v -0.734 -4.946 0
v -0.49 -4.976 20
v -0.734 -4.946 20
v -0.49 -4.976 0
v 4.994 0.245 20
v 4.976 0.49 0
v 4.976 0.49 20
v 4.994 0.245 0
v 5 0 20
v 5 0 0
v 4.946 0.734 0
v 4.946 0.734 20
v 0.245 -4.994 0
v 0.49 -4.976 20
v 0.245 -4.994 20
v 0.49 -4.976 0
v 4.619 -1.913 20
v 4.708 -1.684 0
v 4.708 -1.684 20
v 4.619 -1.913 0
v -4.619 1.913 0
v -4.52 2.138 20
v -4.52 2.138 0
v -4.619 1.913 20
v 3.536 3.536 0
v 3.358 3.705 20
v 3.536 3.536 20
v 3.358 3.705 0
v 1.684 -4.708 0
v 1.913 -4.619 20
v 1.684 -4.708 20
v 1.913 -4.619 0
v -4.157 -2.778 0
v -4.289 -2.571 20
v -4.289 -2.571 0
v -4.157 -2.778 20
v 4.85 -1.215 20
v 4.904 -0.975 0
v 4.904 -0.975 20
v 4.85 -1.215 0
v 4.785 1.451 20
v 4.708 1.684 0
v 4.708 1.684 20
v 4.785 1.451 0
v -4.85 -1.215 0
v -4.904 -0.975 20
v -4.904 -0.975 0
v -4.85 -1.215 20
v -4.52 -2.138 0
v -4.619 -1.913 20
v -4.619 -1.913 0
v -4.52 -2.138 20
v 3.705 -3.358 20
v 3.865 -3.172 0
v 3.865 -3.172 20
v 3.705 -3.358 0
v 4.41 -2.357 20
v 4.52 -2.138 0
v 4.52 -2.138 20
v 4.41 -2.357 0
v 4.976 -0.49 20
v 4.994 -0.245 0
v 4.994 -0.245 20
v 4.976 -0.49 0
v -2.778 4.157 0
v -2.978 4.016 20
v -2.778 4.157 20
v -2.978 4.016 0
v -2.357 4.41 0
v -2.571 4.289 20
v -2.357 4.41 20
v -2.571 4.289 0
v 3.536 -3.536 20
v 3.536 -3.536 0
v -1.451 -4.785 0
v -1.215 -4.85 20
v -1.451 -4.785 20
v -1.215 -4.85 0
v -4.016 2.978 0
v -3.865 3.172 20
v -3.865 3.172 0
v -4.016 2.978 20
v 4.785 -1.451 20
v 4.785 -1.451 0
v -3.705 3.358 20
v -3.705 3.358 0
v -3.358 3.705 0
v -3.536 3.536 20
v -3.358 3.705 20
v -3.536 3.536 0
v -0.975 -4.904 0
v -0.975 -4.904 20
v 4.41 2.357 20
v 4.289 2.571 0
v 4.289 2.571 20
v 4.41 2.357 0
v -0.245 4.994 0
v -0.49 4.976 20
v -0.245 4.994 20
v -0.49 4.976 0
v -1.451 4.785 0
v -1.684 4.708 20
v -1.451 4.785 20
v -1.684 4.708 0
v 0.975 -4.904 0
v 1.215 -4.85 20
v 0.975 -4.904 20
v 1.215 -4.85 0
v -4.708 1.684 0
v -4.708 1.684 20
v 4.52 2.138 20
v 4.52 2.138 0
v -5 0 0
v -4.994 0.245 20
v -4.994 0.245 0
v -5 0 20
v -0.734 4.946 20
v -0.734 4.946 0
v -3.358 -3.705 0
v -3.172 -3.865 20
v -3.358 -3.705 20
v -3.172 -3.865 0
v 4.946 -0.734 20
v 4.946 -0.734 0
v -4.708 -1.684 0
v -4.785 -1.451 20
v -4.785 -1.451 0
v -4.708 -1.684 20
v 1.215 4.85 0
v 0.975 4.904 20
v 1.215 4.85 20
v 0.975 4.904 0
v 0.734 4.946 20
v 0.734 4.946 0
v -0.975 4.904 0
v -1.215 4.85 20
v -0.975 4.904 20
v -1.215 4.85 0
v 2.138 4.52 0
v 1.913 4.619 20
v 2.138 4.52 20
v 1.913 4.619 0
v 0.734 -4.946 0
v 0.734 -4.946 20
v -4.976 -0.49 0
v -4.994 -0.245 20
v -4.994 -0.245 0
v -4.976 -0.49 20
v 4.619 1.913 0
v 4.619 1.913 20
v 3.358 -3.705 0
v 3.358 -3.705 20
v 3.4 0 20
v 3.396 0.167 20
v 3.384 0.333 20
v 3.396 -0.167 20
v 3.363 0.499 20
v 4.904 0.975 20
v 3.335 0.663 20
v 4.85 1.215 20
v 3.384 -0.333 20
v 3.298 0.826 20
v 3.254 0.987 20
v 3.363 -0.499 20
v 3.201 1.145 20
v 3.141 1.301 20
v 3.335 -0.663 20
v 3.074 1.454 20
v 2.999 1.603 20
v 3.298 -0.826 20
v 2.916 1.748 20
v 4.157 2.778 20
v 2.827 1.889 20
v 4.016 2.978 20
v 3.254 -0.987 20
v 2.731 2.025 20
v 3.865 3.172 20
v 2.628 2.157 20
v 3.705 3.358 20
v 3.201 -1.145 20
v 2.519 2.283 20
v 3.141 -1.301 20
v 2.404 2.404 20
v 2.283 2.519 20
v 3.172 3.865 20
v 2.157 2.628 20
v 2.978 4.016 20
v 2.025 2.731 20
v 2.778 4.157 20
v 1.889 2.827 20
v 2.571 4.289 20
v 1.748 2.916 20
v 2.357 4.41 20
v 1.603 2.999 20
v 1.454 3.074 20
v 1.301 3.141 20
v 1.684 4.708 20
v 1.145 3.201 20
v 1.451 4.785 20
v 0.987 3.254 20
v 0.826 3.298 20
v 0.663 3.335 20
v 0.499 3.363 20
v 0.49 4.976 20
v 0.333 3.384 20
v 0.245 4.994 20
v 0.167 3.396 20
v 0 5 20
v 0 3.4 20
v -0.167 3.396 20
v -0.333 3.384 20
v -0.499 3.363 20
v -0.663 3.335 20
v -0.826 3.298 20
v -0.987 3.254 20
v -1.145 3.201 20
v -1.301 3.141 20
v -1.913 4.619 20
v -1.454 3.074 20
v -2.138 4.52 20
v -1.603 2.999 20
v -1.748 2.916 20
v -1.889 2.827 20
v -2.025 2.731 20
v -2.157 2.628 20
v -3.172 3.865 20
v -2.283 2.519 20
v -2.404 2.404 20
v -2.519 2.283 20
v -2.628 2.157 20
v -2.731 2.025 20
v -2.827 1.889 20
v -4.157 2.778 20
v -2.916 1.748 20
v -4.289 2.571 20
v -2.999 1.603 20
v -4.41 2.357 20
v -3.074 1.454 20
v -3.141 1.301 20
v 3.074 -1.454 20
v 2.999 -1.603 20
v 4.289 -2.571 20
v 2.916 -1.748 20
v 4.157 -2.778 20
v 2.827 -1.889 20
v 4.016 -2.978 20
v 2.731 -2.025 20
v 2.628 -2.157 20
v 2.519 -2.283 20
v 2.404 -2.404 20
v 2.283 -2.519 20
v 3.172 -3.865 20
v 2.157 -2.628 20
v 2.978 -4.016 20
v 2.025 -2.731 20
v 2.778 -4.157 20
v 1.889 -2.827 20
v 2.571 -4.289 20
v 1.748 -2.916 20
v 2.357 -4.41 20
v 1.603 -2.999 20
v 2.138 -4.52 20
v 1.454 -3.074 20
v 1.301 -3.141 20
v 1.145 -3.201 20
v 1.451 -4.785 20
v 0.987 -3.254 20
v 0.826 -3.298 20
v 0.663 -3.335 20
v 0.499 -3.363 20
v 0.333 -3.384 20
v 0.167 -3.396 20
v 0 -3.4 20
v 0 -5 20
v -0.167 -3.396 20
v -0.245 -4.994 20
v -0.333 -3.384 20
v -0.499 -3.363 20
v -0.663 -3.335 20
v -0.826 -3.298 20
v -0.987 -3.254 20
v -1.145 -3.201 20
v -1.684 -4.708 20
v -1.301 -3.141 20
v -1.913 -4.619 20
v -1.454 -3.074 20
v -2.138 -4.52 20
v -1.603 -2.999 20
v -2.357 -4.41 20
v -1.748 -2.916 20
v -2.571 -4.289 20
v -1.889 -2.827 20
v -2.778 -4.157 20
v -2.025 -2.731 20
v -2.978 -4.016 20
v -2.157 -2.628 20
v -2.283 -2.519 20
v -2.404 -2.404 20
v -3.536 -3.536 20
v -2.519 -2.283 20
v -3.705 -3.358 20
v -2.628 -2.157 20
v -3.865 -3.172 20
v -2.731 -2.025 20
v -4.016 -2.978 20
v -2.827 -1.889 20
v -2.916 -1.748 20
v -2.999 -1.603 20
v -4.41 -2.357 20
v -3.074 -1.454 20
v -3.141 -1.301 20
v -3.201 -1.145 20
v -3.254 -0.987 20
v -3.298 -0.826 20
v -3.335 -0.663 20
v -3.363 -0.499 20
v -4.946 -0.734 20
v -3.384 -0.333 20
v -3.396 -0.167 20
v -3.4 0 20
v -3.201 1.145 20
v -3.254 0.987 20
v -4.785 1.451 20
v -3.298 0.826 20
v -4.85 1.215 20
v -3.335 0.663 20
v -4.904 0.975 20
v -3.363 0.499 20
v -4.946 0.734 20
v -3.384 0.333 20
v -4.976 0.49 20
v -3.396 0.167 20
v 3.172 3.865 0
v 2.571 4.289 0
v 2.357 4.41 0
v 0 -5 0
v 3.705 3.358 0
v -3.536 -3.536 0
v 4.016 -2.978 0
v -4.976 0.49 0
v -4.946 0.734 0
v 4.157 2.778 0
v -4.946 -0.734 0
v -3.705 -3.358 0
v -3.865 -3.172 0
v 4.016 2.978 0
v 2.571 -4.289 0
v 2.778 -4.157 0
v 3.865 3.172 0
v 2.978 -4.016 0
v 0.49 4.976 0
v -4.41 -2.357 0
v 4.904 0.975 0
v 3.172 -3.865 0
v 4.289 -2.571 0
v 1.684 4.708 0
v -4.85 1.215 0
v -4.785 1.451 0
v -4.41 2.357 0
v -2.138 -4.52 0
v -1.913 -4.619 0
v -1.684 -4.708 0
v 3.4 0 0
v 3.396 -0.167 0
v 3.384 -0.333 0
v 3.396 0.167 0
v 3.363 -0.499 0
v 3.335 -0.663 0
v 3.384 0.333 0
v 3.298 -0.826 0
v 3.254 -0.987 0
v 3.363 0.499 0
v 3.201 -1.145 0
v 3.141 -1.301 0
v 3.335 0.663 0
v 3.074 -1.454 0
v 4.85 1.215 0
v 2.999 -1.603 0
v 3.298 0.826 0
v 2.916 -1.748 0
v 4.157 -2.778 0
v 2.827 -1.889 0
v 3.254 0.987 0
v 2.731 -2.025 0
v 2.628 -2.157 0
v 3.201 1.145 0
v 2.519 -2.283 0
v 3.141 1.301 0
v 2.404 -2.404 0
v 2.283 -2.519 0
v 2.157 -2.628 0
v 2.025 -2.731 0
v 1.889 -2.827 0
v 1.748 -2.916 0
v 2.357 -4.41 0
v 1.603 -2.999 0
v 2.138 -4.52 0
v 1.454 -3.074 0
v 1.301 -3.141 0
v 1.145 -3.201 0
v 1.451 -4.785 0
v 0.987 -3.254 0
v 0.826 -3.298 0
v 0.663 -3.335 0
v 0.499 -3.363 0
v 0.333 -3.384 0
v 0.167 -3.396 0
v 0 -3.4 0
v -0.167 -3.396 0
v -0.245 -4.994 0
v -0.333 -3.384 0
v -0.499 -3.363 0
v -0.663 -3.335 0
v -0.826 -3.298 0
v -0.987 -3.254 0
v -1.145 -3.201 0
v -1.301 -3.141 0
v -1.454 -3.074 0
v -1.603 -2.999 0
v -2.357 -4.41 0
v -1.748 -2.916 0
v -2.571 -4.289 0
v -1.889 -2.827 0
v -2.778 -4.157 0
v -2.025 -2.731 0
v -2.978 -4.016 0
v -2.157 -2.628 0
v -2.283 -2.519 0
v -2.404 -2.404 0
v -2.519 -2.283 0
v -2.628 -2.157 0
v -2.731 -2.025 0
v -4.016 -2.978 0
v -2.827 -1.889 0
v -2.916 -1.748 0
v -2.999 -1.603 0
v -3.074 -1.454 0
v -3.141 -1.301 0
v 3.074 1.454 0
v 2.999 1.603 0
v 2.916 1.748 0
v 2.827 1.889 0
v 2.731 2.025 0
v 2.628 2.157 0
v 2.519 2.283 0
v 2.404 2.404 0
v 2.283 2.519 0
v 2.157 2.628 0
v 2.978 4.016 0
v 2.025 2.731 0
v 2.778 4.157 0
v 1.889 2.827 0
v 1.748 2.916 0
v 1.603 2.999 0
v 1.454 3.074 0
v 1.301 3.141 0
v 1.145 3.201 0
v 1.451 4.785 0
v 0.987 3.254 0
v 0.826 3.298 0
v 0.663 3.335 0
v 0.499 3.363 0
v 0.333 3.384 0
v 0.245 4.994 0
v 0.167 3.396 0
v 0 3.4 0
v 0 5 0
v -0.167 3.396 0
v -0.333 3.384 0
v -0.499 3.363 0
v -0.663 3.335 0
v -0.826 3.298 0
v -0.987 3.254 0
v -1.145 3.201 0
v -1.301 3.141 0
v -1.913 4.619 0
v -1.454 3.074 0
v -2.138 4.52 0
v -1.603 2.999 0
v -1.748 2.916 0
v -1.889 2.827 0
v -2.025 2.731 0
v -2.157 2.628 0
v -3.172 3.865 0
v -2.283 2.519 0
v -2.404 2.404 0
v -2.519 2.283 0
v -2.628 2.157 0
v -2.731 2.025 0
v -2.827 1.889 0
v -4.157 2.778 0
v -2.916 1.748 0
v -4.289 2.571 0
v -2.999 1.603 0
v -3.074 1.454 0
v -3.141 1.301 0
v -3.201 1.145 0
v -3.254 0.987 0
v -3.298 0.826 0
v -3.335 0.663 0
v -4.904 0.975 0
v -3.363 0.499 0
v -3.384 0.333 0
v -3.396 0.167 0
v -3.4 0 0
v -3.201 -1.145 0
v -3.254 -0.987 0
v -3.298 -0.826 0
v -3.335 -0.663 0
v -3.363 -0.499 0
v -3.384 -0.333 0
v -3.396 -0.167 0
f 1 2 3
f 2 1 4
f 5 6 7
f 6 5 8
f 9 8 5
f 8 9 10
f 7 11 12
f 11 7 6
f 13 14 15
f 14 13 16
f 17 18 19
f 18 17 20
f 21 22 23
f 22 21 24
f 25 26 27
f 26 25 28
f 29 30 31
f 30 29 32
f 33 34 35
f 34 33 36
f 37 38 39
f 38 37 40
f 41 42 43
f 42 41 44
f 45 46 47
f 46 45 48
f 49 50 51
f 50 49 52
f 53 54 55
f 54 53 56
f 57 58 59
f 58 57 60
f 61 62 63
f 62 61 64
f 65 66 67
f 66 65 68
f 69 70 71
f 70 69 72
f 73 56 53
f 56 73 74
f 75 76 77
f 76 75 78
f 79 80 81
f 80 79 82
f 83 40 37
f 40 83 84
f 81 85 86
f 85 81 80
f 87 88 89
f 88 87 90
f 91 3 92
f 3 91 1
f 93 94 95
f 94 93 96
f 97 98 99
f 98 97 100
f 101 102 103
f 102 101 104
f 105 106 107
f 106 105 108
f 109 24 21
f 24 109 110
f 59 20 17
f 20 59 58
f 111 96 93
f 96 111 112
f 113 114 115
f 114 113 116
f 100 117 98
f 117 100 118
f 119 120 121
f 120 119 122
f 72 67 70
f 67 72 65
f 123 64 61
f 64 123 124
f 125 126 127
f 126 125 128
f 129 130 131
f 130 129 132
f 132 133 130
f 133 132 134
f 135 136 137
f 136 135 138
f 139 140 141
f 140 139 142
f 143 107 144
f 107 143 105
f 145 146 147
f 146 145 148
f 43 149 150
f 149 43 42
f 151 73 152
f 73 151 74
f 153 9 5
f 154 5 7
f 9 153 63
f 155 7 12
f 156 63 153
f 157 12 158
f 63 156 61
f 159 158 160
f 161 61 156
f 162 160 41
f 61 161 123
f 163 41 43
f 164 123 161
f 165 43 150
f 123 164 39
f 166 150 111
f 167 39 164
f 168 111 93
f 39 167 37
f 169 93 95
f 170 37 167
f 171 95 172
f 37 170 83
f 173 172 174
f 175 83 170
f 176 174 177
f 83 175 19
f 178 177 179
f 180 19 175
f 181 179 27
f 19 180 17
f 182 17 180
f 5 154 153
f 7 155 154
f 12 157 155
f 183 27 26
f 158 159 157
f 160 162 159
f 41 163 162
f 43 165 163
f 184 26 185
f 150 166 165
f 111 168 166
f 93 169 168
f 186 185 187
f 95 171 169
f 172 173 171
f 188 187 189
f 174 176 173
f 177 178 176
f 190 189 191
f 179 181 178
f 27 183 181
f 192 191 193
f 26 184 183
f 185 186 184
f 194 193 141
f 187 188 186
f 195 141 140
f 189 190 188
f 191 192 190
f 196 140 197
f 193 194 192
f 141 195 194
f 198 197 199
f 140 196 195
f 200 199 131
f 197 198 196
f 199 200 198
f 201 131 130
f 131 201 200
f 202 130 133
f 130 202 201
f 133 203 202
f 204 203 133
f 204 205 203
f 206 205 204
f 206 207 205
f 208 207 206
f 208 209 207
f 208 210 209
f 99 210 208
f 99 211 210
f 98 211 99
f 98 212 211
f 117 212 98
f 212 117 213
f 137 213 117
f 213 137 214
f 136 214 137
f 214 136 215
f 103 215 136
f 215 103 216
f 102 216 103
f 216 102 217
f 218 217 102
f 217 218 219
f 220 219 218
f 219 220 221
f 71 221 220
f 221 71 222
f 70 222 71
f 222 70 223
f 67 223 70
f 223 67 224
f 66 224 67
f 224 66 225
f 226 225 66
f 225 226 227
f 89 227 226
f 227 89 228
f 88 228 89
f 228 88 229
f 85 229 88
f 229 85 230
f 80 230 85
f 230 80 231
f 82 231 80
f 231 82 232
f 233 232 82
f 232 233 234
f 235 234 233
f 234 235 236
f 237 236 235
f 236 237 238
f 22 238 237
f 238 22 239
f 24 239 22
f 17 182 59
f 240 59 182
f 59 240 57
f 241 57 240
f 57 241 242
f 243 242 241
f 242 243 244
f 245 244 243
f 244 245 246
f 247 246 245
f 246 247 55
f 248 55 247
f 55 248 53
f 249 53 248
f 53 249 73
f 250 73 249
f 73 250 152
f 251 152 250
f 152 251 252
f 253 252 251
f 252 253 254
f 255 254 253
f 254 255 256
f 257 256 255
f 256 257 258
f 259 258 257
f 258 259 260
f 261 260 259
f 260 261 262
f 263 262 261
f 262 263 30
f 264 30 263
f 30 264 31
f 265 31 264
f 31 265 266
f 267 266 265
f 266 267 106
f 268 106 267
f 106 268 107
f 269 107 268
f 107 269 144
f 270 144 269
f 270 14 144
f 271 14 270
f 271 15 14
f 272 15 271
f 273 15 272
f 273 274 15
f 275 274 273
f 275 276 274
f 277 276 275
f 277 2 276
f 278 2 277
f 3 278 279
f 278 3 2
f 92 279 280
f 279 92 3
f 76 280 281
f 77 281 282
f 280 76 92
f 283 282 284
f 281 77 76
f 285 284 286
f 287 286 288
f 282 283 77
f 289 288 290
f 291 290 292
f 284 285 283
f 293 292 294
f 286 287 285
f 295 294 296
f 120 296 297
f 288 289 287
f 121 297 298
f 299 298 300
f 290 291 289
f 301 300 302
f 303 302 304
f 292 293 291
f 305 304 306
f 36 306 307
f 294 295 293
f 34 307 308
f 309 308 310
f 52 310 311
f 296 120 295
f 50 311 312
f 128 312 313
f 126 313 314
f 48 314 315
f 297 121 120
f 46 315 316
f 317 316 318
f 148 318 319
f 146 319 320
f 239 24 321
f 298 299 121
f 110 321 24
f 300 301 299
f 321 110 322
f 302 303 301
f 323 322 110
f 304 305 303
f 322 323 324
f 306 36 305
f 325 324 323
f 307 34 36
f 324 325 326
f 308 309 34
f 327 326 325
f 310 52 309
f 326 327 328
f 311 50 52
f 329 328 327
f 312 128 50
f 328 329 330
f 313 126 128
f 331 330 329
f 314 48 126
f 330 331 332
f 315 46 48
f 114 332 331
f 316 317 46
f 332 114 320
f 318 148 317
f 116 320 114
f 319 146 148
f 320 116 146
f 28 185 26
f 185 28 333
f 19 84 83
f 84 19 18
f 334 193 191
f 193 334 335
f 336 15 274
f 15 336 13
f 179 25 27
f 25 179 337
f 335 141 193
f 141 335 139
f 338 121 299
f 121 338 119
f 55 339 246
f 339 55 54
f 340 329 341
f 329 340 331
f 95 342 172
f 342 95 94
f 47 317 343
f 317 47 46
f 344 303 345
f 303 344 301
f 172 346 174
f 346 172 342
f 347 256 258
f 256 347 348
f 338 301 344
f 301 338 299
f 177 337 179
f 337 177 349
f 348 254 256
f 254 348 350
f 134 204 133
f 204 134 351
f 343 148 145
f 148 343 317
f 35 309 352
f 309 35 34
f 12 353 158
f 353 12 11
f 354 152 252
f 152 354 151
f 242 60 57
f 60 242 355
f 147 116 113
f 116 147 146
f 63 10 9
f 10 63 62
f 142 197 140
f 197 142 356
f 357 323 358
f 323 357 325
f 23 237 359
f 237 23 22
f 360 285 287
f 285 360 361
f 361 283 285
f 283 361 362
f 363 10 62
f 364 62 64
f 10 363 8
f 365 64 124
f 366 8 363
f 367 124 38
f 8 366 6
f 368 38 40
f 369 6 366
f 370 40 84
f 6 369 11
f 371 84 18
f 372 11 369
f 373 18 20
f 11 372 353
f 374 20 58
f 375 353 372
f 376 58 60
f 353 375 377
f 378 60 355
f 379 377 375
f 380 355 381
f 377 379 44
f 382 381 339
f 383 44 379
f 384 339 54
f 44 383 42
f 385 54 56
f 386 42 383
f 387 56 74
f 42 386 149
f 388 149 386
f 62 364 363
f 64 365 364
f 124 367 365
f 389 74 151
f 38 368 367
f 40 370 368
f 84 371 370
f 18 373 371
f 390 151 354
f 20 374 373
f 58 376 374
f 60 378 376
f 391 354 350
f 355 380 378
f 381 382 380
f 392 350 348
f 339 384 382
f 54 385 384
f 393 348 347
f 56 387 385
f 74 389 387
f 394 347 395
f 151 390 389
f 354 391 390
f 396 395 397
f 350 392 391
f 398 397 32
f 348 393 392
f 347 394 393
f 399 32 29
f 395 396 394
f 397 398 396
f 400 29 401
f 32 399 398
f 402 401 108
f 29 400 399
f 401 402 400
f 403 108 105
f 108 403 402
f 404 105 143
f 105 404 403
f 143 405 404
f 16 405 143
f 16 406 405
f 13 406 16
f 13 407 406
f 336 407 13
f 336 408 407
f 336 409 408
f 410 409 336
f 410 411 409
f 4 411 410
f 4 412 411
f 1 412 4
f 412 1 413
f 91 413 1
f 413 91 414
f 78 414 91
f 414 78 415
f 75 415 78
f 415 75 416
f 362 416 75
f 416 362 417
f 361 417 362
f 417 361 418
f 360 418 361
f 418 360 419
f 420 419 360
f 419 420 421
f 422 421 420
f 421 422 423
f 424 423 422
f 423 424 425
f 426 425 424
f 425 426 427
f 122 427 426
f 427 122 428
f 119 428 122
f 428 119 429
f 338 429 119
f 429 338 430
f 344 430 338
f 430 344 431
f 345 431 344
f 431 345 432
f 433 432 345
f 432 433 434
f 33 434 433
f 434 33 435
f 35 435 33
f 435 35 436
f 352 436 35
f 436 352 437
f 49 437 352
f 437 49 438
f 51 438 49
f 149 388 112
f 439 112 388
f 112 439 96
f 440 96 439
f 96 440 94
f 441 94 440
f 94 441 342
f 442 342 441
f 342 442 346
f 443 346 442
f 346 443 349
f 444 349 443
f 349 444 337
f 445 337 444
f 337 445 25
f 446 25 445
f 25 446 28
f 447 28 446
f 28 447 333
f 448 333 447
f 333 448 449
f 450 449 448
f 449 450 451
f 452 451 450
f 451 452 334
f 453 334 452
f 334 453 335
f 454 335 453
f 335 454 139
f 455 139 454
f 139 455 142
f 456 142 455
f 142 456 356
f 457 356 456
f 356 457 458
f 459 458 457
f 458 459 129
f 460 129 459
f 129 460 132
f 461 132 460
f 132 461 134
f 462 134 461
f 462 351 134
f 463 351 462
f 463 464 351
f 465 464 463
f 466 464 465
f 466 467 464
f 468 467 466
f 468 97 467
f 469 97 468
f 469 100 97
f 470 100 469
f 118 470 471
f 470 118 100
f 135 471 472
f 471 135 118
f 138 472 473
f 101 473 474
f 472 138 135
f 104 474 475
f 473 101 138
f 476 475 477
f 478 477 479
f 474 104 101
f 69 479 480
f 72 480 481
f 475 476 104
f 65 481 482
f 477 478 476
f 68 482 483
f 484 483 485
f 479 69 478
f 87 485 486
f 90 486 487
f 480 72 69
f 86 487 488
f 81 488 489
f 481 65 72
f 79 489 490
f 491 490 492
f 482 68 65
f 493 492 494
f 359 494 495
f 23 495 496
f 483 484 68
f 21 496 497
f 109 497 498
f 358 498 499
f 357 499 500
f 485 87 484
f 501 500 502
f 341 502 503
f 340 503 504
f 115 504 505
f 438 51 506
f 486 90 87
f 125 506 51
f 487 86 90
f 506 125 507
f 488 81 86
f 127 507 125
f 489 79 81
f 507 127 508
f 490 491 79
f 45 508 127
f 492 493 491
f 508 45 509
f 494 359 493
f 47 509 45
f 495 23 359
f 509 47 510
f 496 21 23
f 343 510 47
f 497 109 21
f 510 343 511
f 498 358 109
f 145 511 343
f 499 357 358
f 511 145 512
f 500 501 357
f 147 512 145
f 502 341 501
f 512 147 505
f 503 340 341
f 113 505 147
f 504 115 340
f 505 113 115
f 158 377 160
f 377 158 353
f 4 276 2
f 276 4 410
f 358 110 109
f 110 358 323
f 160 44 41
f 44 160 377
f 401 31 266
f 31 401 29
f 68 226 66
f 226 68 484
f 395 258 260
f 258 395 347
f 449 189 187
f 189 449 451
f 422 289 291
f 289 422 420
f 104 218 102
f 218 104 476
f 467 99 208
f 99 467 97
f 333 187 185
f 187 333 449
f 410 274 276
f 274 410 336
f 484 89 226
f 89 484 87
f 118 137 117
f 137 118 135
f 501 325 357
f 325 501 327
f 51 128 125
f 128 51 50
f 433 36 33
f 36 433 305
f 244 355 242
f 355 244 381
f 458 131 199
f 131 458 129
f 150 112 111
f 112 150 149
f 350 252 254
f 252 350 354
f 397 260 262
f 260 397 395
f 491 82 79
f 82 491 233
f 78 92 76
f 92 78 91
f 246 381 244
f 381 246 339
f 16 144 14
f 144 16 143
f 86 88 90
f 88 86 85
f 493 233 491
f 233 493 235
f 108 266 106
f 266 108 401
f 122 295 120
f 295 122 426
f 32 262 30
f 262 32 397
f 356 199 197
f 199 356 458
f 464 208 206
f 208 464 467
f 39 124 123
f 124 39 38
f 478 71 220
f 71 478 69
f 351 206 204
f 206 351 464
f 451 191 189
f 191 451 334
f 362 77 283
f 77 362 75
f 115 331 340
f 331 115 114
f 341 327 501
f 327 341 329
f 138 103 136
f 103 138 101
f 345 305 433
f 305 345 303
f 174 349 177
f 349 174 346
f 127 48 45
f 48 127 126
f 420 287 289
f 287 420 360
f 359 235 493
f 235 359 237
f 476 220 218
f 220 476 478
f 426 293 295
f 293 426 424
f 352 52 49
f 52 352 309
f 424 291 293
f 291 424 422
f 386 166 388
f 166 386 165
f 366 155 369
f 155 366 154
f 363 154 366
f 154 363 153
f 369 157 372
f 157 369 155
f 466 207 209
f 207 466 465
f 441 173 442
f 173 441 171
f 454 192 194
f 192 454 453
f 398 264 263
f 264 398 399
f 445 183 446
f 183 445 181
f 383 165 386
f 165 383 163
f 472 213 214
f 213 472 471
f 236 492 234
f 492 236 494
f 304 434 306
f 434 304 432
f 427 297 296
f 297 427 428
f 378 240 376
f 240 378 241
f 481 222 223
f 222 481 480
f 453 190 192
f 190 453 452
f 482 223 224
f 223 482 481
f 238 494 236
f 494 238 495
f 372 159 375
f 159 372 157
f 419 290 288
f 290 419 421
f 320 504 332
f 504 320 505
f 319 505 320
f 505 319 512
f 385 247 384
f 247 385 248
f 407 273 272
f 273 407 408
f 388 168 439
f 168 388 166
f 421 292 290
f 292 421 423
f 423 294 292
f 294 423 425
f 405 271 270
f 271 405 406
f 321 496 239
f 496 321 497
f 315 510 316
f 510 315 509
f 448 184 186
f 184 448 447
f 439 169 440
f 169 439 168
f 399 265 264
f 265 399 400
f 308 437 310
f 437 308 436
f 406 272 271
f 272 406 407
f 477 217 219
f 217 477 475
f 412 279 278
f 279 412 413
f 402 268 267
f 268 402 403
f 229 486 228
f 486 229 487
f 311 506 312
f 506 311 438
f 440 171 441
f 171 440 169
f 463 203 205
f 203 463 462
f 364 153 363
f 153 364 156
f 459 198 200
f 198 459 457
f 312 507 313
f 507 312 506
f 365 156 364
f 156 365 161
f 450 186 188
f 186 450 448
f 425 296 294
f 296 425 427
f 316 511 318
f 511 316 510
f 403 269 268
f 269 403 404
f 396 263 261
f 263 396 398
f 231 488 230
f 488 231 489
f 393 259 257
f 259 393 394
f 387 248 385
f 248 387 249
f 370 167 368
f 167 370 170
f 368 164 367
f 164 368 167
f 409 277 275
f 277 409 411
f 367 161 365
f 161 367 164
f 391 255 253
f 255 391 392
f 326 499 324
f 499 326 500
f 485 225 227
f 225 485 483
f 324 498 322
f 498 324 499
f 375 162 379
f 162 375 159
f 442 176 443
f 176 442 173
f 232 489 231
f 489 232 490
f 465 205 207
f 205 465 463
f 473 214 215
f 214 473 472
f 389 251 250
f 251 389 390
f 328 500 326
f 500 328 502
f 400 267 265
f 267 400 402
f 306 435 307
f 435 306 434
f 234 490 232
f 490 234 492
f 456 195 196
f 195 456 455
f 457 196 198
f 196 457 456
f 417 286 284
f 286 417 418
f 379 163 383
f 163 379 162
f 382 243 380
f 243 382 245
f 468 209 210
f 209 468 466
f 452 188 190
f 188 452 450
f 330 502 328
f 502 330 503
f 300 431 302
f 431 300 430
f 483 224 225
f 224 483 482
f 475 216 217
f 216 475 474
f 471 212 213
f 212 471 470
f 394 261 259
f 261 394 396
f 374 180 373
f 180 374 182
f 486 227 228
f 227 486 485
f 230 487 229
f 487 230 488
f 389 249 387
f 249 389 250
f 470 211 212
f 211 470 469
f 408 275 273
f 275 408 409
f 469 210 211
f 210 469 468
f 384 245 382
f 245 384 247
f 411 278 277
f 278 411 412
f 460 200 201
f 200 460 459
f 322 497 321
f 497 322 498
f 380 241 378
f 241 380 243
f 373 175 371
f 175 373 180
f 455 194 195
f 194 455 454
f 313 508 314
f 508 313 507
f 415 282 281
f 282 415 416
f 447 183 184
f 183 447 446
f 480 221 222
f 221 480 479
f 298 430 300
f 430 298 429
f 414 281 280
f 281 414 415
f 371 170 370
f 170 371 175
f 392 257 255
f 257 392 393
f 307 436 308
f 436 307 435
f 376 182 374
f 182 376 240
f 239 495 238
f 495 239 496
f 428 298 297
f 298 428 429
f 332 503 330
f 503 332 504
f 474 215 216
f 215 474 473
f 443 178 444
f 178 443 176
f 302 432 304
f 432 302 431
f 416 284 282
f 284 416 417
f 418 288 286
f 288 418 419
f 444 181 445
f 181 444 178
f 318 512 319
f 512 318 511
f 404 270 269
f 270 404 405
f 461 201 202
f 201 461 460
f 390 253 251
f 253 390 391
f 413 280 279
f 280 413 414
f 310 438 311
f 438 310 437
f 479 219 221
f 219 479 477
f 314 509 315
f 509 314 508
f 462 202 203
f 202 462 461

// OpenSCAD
// Small Lab Funnel - Corrected
// Designed for FDM printing: printed upright, spout at bottom.

// --- Dimensions ---
spout_od     = 10.0;    // Outer diameter of the spout (mm)
spout_height = 20.0;    // Height of the spout (mm)
rim_od       = 60.0;    // Outer diameter at the top rim (mm)
funnel_height = 30.0;   // Height of the conical section (mm)
wall_thick   = 1.6;     // Wall thickness (mm)

// --- Derived Dimensions ---
spout_id     = spout_od - (2 * wall_thick);
rim_id       = rim_od - (2 * wall_thick);

$fn = 128;

// --- Geometry Construction ---

module funnel_body() {
    union() {
        // Spout section: sits on Z=0
        cylinder(h = spout_height, d = spout_od);
        
        // Conical section: starts at Z = spout_height
        translate([0, 0, spout_height])
        rotate_extrude() {
            polygon(points = [
                [spout_od / 2, 0],              // Bottom of cone profile
                [rim_od / 2, funnel_height]     // Top of cone profile
            ]);
        }
    }
}

module internal_hollow() {
    // Spout bore: goes through the bottom
    translate([0, 0, -1])
        cylinder(h = spout_height + 2, d = spout_id);
    
    // Conical bore: starts at Z = spout_height
    translate([0, 0, spout_height])
    rotate_extrude() {
        polygon(points = [
            [spout_id / 2, -1],              // Start slightly below spout junction
            [rim_id / 2, funnel_height + 1] // End slightly above rim
        ]);
    }
}

// Final Assembly
difference() {
    // The solid outer shell
    funnel_body();
    
    // The hollow interior
    internal_hollow();
}
